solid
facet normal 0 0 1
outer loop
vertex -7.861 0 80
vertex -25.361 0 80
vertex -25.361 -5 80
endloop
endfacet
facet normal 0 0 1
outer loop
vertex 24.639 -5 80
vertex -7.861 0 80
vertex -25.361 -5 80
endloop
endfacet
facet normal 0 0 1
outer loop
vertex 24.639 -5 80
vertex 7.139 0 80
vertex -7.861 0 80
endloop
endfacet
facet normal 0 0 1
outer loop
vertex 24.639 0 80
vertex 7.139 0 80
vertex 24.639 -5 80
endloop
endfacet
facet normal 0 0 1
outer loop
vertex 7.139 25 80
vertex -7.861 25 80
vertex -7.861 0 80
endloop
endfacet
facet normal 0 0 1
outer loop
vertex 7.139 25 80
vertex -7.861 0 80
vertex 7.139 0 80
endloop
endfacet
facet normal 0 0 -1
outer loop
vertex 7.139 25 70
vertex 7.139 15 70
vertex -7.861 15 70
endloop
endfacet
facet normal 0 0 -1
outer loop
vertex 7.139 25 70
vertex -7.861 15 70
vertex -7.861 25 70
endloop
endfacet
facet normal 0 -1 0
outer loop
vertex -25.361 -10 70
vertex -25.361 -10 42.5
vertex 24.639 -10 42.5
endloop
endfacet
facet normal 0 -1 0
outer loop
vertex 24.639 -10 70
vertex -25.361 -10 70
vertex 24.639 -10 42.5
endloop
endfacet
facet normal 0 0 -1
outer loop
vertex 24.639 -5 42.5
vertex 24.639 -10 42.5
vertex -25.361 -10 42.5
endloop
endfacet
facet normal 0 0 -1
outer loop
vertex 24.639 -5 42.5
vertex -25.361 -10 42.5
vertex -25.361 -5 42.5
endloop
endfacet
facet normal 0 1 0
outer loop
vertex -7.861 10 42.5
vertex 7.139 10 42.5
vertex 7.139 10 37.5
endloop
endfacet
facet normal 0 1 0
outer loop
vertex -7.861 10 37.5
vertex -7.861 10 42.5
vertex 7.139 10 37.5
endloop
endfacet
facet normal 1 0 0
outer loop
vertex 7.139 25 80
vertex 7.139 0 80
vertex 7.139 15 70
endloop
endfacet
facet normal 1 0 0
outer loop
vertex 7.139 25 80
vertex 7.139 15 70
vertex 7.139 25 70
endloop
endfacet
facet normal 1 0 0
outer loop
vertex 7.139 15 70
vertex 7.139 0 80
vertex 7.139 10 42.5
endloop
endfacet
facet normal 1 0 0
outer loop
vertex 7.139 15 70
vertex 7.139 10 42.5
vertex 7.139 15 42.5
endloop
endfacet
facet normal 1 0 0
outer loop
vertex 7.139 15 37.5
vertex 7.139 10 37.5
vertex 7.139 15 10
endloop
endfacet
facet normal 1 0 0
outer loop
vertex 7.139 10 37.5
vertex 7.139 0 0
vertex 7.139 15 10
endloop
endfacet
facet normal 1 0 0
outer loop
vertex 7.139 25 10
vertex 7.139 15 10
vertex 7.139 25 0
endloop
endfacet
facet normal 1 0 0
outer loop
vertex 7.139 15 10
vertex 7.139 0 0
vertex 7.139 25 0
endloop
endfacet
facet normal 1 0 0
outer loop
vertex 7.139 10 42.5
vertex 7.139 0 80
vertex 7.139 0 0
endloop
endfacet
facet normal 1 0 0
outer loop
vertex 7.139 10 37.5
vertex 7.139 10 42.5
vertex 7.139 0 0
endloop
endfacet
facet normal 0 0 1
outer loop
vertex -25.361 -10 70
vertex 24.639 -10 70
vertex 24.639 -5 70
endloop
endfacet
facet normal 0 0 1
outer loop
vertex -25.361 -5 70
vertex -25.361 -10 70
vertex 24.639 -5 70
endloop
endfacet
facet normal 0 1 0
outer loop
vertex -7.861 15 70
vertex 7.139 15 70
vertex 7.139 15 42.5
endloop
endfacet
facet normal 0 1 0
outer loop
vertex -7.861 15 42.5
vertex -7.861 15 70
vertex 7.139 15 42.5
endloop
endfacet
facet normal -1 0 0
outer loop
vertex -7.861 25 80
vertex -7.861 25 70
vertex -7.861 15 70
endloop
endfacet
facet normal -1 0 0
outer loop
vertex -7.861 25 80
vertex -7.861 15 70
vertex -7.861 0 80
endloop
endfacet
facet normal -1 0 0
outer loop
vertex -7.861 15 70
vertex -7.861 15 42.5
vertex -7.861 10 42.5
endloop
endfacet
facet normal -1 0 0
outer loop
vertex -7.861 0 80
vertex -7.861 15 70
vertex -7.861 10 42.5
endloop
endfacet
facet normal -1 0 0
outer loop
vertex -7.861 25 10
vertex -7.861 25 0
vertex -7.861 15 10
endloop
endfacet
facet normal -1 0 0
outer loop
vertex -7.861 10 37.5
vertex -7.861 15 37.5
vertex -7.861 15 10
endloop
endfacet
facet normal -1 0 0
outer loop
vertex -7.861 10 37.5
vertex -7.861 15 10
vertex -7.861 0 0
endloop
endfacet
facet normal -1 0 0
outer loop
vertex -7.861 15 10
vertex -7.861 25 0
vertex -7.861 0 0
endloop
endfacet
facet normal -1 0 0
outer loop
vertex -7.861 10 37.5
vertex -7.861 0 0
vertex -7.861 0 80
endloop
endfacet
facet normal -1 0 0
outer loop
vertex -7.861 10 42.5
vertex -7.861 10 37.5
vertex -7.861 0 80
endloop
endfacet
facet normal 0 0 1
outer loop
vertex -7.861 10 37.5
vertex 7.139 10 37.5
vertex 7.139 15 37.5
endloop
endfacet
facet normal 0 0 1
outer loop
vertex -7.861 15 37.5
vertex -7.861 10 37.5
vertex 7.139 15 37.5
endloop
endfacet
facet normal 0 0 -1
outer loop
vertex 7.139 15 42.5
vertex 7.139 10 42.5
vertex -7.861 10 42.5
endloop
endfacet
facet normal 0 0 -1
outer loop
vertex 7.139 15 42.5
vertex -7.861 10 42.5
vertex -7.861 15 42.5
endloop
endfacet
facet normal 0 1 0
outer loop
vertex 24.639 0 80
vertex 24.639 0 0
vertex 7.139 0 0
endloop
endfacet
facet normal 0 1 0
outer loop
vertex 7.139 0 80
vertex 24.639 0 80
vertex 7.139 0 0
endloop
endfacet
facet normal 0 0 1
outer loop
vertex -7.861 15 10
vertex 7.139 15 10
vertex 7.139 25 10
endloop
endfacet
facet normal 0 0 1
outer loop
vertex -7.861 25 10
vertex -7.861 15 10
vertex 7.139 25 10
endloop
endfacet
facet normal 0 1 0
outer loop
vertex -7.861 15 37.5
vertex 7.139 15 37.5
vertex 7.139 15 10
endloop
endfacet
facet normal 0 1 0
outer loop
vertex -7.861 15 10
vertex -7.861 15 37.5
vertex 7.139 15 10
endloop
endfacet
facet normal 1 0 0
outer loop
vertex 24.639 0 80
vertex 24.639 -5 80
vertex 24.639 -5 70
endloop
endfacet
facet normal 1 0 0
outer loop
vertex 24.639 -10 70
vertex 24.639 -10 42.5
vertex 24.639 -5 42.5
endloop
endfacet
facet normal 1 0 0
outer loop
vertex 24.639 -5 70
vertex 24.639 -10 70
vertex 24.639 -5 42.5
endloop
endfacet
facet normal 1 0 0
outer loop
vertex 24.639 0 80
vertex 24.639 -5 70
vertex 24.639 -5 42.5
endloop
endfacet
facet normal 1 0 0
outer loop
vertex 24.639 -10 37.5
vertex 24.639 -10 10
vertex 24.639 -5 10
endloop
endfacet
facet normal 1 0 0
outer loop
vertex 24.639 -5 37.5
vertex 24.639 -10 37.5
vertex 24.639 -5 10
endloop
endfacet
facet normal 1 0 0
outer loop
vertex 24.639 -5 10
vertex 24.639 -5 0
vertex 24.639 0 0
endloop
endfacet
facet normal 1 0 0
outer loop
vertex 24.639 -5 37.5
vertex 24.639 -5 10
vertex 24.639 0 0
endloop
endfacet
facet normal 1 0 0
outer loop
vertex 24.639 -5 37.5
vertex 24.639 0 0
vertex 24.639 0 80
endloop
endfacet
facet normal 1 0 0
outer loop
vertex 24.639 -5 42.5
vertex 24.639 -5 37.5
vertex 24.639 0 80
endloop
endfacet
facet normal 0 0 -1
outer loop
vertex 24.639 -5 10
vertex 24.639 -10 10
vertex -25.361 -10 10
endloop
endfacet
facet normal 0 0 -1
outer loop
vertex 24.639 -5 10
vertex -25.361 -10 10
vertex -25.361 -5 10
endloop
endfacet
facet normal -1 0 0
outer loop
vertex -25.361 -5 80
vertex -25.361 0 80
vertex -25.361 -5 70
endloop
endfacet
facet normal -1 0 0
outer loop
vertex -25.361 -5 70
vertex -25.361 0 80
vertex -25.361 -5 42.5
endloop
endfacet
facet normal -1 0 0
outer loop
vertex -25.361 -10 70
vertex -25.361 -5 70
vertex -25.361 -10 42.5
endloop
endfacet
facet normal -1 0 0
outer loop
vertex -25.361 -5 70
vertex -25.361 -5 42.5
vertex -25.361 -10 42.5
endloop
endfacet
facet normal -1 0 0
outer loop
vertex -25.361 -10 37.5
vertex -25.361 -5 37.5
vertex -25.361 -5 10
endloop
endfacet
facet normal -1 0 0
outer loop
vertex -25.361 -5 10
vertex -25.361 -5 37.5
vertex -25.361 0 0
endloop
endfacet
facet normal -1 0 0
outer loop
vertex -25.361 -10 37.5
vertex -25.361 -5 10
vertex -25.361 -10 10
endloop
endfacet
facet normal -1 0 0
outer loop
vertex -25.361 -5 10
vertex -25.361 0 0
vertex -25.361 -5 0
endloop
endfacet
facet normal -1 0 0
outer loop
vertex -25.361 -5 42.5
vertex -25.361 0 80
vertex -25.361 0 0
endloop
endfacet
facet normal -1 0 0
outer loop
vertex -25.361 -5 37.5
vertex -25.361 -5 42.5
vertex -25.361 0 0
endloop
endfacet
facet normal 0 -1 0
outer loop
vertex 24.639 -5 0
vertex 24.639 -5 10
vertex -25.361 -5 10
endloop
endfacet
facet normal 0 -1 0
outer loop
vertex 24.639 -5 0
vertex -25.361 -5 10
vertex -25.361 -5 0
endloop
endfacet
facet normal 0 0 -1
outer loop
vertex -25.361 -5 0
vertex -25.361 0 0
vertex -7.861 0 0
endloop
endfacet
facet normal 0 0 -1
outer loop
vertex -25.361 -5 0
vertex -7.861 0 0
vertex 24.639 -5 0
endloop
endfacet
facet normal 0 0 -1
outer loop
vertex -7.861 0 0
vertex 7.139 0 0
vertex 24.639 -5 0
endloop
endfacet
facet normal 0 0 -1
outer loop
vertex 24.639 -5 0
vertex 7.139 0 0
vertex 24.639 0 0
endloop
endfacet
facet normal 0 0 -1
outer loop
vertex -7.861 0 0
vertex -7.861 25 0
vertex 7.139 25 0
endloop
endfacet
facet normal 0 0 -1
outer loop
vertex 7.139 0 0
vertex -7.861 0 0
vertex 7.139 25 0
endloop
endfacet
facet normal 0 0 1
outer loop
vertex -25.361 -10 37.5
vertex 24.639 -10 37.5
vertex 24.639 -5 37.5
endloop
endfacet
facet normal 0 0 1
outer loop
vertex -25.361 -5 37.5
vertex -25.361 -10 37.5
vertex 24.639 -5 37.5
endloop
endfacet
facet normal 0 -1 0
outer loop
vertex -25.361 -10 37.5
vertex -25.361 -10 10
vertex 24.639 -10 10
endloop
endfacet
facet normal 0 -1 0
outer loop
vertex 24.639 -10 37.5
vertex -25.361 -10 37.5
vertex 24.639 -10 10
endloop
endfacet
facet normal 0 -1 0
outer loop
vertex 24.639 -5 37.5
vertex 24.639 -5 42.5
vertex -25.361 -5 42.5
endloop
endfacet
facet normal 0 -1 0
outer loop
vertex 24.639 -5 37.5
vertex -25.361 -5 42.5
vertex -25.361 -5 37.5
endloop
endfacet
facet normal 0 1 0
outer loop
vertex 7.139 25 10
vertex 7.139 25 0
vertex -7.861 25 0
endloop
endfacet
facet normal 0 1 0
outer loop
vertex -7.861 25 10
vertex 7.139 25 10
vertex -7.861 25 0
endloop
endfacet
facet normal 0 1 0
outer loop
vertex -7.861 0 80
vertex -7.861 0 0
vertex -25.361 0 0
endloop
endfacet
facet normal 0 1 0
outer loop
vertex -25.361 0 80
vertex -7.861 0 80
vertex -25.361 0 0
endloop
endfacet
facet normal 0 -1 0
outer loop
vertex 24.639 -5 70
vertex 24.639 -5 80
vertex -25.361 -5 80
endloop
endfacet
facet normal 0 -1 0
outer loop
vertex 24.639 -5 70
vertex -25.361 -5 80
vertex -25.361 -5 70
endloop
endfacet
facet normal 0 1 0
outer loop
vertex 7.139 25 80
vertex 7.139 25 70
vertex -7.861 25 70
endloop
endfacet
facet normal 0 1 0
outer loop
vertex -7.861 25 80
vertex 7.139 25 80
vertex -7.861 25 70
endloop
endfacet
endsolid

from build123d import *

# Parameters (mm, degrees)
BOSS_EXTRUDE1_DEPTH = 80
SKETCH4_W           = 60
SKETCH4_H           = 10
CUT_EXTRUDE1_DEPTH  = 90.895772982
SKETCH9_W           = 10
SKETCH9_H           = 5
CUT_EXTRUDE6_DEPTH  = 98.59610648
SKETCH10_W          = 10
SKETCH10_H          = 5
CUT_EXTRUDE7_DEPTH  = 98.59610648
SKETCH12_W          = 5
SKETCH12_H          = 5
CUT_EXTRUDE9_DEPTH  = 98.59610648
SKETCH6_W           = 5
SKETCH6_H           = 5
CUT_EXTRUDE11_DEPTH = 90.895772982


with BuildPart() as part:
    # Sketch1 → Boss-Extrude1 (new body)
    with BuildSketch(Plane.XY):
        Polygon((-7.860697776, 0), (-25.360697776, 0), (-25.360697776, -10), (24.639302224, -10), (24.639302224, 0), (7.139302224, 0), (7.139302224, 25), (-7.860697776, 25), align=None)
    extrude(amount=BOSS_EXTRUDE1_DEPTH)

    # Sketch4 → Cut-Extrude1 (cut, through all)
    with BuildSketch(Plane(origin=(7.139302224, 0, 0), x_dir=(0, 0, -1), z_dir=(1, 0, 0))):
        with Locations((-40, 20)):
            Rectangle(SKETCH4_W, SKETCH4_H)
    extrude(amount=-CUT_EXTRUDE1_DEPTH, mode=Mode.SUBTRACT)

    # Sketch9 → Cut-Extrude6 (cut, through all)
    with BuildSketch(Plane(origin=(24.639302224, 0, 0), x_dir=(0, 0, -1), z_dir=(1, 0, 0))):
        with Locations((-75, -7.5)):
            Rectangle(SKETCH9_W, SKETCH9_H)
    extrude(amount=-CUT_EXTRUDE6_DEPTH, mode=Mode.SUBTRACT)

    # Sketch10 → Cut-Extrude7 (cut, through all)
    with BuildSketch(Plane(origin=(24.639302224, 0, 0), x_dir=(0, 0, -1), z_dir=(1, 0, 0))):
        with Locations((-5, -7.5)):
            Rectangle(SKETCH10_W, SKETCH10_H)
    extrude(amount=-CUT_EXTRUDE7_DEPTH, mode=Mode.SUBTRACT)

    # Sketch12 → Cut-Extrude9 (cut, through all)
    with BuildSketch(Plane(origin=(24.639302224, 0, 0), x_dir=(0, 0, -1), z_dir=(1, 0, 0))):
        with Locations((-39.999750499, -7.5)):
            Rectangle(SKETCH12_W, SKETCH12_H)
    extrude(amount=-CUT_EXTRUDE9_DEPTH, mode=Mode.SUBTRACT)

    # Sketch6 → Cut-Extrude11 (cut, through all)
    with BuildSketch(Plane(origin=(7.139302224, 0, 0), x_dir=(0, 0, -1), z_dir=(1, 0, 0))):
        with Locations((-39.999750499, 12.5)):
            Rectangle(SKETCH6_W, SKETCH6_H)
    extrude(amount=-CUT_EXTRUDE11_DEPTH, mode=Mode.SUBTRACT)


solid = part.part
